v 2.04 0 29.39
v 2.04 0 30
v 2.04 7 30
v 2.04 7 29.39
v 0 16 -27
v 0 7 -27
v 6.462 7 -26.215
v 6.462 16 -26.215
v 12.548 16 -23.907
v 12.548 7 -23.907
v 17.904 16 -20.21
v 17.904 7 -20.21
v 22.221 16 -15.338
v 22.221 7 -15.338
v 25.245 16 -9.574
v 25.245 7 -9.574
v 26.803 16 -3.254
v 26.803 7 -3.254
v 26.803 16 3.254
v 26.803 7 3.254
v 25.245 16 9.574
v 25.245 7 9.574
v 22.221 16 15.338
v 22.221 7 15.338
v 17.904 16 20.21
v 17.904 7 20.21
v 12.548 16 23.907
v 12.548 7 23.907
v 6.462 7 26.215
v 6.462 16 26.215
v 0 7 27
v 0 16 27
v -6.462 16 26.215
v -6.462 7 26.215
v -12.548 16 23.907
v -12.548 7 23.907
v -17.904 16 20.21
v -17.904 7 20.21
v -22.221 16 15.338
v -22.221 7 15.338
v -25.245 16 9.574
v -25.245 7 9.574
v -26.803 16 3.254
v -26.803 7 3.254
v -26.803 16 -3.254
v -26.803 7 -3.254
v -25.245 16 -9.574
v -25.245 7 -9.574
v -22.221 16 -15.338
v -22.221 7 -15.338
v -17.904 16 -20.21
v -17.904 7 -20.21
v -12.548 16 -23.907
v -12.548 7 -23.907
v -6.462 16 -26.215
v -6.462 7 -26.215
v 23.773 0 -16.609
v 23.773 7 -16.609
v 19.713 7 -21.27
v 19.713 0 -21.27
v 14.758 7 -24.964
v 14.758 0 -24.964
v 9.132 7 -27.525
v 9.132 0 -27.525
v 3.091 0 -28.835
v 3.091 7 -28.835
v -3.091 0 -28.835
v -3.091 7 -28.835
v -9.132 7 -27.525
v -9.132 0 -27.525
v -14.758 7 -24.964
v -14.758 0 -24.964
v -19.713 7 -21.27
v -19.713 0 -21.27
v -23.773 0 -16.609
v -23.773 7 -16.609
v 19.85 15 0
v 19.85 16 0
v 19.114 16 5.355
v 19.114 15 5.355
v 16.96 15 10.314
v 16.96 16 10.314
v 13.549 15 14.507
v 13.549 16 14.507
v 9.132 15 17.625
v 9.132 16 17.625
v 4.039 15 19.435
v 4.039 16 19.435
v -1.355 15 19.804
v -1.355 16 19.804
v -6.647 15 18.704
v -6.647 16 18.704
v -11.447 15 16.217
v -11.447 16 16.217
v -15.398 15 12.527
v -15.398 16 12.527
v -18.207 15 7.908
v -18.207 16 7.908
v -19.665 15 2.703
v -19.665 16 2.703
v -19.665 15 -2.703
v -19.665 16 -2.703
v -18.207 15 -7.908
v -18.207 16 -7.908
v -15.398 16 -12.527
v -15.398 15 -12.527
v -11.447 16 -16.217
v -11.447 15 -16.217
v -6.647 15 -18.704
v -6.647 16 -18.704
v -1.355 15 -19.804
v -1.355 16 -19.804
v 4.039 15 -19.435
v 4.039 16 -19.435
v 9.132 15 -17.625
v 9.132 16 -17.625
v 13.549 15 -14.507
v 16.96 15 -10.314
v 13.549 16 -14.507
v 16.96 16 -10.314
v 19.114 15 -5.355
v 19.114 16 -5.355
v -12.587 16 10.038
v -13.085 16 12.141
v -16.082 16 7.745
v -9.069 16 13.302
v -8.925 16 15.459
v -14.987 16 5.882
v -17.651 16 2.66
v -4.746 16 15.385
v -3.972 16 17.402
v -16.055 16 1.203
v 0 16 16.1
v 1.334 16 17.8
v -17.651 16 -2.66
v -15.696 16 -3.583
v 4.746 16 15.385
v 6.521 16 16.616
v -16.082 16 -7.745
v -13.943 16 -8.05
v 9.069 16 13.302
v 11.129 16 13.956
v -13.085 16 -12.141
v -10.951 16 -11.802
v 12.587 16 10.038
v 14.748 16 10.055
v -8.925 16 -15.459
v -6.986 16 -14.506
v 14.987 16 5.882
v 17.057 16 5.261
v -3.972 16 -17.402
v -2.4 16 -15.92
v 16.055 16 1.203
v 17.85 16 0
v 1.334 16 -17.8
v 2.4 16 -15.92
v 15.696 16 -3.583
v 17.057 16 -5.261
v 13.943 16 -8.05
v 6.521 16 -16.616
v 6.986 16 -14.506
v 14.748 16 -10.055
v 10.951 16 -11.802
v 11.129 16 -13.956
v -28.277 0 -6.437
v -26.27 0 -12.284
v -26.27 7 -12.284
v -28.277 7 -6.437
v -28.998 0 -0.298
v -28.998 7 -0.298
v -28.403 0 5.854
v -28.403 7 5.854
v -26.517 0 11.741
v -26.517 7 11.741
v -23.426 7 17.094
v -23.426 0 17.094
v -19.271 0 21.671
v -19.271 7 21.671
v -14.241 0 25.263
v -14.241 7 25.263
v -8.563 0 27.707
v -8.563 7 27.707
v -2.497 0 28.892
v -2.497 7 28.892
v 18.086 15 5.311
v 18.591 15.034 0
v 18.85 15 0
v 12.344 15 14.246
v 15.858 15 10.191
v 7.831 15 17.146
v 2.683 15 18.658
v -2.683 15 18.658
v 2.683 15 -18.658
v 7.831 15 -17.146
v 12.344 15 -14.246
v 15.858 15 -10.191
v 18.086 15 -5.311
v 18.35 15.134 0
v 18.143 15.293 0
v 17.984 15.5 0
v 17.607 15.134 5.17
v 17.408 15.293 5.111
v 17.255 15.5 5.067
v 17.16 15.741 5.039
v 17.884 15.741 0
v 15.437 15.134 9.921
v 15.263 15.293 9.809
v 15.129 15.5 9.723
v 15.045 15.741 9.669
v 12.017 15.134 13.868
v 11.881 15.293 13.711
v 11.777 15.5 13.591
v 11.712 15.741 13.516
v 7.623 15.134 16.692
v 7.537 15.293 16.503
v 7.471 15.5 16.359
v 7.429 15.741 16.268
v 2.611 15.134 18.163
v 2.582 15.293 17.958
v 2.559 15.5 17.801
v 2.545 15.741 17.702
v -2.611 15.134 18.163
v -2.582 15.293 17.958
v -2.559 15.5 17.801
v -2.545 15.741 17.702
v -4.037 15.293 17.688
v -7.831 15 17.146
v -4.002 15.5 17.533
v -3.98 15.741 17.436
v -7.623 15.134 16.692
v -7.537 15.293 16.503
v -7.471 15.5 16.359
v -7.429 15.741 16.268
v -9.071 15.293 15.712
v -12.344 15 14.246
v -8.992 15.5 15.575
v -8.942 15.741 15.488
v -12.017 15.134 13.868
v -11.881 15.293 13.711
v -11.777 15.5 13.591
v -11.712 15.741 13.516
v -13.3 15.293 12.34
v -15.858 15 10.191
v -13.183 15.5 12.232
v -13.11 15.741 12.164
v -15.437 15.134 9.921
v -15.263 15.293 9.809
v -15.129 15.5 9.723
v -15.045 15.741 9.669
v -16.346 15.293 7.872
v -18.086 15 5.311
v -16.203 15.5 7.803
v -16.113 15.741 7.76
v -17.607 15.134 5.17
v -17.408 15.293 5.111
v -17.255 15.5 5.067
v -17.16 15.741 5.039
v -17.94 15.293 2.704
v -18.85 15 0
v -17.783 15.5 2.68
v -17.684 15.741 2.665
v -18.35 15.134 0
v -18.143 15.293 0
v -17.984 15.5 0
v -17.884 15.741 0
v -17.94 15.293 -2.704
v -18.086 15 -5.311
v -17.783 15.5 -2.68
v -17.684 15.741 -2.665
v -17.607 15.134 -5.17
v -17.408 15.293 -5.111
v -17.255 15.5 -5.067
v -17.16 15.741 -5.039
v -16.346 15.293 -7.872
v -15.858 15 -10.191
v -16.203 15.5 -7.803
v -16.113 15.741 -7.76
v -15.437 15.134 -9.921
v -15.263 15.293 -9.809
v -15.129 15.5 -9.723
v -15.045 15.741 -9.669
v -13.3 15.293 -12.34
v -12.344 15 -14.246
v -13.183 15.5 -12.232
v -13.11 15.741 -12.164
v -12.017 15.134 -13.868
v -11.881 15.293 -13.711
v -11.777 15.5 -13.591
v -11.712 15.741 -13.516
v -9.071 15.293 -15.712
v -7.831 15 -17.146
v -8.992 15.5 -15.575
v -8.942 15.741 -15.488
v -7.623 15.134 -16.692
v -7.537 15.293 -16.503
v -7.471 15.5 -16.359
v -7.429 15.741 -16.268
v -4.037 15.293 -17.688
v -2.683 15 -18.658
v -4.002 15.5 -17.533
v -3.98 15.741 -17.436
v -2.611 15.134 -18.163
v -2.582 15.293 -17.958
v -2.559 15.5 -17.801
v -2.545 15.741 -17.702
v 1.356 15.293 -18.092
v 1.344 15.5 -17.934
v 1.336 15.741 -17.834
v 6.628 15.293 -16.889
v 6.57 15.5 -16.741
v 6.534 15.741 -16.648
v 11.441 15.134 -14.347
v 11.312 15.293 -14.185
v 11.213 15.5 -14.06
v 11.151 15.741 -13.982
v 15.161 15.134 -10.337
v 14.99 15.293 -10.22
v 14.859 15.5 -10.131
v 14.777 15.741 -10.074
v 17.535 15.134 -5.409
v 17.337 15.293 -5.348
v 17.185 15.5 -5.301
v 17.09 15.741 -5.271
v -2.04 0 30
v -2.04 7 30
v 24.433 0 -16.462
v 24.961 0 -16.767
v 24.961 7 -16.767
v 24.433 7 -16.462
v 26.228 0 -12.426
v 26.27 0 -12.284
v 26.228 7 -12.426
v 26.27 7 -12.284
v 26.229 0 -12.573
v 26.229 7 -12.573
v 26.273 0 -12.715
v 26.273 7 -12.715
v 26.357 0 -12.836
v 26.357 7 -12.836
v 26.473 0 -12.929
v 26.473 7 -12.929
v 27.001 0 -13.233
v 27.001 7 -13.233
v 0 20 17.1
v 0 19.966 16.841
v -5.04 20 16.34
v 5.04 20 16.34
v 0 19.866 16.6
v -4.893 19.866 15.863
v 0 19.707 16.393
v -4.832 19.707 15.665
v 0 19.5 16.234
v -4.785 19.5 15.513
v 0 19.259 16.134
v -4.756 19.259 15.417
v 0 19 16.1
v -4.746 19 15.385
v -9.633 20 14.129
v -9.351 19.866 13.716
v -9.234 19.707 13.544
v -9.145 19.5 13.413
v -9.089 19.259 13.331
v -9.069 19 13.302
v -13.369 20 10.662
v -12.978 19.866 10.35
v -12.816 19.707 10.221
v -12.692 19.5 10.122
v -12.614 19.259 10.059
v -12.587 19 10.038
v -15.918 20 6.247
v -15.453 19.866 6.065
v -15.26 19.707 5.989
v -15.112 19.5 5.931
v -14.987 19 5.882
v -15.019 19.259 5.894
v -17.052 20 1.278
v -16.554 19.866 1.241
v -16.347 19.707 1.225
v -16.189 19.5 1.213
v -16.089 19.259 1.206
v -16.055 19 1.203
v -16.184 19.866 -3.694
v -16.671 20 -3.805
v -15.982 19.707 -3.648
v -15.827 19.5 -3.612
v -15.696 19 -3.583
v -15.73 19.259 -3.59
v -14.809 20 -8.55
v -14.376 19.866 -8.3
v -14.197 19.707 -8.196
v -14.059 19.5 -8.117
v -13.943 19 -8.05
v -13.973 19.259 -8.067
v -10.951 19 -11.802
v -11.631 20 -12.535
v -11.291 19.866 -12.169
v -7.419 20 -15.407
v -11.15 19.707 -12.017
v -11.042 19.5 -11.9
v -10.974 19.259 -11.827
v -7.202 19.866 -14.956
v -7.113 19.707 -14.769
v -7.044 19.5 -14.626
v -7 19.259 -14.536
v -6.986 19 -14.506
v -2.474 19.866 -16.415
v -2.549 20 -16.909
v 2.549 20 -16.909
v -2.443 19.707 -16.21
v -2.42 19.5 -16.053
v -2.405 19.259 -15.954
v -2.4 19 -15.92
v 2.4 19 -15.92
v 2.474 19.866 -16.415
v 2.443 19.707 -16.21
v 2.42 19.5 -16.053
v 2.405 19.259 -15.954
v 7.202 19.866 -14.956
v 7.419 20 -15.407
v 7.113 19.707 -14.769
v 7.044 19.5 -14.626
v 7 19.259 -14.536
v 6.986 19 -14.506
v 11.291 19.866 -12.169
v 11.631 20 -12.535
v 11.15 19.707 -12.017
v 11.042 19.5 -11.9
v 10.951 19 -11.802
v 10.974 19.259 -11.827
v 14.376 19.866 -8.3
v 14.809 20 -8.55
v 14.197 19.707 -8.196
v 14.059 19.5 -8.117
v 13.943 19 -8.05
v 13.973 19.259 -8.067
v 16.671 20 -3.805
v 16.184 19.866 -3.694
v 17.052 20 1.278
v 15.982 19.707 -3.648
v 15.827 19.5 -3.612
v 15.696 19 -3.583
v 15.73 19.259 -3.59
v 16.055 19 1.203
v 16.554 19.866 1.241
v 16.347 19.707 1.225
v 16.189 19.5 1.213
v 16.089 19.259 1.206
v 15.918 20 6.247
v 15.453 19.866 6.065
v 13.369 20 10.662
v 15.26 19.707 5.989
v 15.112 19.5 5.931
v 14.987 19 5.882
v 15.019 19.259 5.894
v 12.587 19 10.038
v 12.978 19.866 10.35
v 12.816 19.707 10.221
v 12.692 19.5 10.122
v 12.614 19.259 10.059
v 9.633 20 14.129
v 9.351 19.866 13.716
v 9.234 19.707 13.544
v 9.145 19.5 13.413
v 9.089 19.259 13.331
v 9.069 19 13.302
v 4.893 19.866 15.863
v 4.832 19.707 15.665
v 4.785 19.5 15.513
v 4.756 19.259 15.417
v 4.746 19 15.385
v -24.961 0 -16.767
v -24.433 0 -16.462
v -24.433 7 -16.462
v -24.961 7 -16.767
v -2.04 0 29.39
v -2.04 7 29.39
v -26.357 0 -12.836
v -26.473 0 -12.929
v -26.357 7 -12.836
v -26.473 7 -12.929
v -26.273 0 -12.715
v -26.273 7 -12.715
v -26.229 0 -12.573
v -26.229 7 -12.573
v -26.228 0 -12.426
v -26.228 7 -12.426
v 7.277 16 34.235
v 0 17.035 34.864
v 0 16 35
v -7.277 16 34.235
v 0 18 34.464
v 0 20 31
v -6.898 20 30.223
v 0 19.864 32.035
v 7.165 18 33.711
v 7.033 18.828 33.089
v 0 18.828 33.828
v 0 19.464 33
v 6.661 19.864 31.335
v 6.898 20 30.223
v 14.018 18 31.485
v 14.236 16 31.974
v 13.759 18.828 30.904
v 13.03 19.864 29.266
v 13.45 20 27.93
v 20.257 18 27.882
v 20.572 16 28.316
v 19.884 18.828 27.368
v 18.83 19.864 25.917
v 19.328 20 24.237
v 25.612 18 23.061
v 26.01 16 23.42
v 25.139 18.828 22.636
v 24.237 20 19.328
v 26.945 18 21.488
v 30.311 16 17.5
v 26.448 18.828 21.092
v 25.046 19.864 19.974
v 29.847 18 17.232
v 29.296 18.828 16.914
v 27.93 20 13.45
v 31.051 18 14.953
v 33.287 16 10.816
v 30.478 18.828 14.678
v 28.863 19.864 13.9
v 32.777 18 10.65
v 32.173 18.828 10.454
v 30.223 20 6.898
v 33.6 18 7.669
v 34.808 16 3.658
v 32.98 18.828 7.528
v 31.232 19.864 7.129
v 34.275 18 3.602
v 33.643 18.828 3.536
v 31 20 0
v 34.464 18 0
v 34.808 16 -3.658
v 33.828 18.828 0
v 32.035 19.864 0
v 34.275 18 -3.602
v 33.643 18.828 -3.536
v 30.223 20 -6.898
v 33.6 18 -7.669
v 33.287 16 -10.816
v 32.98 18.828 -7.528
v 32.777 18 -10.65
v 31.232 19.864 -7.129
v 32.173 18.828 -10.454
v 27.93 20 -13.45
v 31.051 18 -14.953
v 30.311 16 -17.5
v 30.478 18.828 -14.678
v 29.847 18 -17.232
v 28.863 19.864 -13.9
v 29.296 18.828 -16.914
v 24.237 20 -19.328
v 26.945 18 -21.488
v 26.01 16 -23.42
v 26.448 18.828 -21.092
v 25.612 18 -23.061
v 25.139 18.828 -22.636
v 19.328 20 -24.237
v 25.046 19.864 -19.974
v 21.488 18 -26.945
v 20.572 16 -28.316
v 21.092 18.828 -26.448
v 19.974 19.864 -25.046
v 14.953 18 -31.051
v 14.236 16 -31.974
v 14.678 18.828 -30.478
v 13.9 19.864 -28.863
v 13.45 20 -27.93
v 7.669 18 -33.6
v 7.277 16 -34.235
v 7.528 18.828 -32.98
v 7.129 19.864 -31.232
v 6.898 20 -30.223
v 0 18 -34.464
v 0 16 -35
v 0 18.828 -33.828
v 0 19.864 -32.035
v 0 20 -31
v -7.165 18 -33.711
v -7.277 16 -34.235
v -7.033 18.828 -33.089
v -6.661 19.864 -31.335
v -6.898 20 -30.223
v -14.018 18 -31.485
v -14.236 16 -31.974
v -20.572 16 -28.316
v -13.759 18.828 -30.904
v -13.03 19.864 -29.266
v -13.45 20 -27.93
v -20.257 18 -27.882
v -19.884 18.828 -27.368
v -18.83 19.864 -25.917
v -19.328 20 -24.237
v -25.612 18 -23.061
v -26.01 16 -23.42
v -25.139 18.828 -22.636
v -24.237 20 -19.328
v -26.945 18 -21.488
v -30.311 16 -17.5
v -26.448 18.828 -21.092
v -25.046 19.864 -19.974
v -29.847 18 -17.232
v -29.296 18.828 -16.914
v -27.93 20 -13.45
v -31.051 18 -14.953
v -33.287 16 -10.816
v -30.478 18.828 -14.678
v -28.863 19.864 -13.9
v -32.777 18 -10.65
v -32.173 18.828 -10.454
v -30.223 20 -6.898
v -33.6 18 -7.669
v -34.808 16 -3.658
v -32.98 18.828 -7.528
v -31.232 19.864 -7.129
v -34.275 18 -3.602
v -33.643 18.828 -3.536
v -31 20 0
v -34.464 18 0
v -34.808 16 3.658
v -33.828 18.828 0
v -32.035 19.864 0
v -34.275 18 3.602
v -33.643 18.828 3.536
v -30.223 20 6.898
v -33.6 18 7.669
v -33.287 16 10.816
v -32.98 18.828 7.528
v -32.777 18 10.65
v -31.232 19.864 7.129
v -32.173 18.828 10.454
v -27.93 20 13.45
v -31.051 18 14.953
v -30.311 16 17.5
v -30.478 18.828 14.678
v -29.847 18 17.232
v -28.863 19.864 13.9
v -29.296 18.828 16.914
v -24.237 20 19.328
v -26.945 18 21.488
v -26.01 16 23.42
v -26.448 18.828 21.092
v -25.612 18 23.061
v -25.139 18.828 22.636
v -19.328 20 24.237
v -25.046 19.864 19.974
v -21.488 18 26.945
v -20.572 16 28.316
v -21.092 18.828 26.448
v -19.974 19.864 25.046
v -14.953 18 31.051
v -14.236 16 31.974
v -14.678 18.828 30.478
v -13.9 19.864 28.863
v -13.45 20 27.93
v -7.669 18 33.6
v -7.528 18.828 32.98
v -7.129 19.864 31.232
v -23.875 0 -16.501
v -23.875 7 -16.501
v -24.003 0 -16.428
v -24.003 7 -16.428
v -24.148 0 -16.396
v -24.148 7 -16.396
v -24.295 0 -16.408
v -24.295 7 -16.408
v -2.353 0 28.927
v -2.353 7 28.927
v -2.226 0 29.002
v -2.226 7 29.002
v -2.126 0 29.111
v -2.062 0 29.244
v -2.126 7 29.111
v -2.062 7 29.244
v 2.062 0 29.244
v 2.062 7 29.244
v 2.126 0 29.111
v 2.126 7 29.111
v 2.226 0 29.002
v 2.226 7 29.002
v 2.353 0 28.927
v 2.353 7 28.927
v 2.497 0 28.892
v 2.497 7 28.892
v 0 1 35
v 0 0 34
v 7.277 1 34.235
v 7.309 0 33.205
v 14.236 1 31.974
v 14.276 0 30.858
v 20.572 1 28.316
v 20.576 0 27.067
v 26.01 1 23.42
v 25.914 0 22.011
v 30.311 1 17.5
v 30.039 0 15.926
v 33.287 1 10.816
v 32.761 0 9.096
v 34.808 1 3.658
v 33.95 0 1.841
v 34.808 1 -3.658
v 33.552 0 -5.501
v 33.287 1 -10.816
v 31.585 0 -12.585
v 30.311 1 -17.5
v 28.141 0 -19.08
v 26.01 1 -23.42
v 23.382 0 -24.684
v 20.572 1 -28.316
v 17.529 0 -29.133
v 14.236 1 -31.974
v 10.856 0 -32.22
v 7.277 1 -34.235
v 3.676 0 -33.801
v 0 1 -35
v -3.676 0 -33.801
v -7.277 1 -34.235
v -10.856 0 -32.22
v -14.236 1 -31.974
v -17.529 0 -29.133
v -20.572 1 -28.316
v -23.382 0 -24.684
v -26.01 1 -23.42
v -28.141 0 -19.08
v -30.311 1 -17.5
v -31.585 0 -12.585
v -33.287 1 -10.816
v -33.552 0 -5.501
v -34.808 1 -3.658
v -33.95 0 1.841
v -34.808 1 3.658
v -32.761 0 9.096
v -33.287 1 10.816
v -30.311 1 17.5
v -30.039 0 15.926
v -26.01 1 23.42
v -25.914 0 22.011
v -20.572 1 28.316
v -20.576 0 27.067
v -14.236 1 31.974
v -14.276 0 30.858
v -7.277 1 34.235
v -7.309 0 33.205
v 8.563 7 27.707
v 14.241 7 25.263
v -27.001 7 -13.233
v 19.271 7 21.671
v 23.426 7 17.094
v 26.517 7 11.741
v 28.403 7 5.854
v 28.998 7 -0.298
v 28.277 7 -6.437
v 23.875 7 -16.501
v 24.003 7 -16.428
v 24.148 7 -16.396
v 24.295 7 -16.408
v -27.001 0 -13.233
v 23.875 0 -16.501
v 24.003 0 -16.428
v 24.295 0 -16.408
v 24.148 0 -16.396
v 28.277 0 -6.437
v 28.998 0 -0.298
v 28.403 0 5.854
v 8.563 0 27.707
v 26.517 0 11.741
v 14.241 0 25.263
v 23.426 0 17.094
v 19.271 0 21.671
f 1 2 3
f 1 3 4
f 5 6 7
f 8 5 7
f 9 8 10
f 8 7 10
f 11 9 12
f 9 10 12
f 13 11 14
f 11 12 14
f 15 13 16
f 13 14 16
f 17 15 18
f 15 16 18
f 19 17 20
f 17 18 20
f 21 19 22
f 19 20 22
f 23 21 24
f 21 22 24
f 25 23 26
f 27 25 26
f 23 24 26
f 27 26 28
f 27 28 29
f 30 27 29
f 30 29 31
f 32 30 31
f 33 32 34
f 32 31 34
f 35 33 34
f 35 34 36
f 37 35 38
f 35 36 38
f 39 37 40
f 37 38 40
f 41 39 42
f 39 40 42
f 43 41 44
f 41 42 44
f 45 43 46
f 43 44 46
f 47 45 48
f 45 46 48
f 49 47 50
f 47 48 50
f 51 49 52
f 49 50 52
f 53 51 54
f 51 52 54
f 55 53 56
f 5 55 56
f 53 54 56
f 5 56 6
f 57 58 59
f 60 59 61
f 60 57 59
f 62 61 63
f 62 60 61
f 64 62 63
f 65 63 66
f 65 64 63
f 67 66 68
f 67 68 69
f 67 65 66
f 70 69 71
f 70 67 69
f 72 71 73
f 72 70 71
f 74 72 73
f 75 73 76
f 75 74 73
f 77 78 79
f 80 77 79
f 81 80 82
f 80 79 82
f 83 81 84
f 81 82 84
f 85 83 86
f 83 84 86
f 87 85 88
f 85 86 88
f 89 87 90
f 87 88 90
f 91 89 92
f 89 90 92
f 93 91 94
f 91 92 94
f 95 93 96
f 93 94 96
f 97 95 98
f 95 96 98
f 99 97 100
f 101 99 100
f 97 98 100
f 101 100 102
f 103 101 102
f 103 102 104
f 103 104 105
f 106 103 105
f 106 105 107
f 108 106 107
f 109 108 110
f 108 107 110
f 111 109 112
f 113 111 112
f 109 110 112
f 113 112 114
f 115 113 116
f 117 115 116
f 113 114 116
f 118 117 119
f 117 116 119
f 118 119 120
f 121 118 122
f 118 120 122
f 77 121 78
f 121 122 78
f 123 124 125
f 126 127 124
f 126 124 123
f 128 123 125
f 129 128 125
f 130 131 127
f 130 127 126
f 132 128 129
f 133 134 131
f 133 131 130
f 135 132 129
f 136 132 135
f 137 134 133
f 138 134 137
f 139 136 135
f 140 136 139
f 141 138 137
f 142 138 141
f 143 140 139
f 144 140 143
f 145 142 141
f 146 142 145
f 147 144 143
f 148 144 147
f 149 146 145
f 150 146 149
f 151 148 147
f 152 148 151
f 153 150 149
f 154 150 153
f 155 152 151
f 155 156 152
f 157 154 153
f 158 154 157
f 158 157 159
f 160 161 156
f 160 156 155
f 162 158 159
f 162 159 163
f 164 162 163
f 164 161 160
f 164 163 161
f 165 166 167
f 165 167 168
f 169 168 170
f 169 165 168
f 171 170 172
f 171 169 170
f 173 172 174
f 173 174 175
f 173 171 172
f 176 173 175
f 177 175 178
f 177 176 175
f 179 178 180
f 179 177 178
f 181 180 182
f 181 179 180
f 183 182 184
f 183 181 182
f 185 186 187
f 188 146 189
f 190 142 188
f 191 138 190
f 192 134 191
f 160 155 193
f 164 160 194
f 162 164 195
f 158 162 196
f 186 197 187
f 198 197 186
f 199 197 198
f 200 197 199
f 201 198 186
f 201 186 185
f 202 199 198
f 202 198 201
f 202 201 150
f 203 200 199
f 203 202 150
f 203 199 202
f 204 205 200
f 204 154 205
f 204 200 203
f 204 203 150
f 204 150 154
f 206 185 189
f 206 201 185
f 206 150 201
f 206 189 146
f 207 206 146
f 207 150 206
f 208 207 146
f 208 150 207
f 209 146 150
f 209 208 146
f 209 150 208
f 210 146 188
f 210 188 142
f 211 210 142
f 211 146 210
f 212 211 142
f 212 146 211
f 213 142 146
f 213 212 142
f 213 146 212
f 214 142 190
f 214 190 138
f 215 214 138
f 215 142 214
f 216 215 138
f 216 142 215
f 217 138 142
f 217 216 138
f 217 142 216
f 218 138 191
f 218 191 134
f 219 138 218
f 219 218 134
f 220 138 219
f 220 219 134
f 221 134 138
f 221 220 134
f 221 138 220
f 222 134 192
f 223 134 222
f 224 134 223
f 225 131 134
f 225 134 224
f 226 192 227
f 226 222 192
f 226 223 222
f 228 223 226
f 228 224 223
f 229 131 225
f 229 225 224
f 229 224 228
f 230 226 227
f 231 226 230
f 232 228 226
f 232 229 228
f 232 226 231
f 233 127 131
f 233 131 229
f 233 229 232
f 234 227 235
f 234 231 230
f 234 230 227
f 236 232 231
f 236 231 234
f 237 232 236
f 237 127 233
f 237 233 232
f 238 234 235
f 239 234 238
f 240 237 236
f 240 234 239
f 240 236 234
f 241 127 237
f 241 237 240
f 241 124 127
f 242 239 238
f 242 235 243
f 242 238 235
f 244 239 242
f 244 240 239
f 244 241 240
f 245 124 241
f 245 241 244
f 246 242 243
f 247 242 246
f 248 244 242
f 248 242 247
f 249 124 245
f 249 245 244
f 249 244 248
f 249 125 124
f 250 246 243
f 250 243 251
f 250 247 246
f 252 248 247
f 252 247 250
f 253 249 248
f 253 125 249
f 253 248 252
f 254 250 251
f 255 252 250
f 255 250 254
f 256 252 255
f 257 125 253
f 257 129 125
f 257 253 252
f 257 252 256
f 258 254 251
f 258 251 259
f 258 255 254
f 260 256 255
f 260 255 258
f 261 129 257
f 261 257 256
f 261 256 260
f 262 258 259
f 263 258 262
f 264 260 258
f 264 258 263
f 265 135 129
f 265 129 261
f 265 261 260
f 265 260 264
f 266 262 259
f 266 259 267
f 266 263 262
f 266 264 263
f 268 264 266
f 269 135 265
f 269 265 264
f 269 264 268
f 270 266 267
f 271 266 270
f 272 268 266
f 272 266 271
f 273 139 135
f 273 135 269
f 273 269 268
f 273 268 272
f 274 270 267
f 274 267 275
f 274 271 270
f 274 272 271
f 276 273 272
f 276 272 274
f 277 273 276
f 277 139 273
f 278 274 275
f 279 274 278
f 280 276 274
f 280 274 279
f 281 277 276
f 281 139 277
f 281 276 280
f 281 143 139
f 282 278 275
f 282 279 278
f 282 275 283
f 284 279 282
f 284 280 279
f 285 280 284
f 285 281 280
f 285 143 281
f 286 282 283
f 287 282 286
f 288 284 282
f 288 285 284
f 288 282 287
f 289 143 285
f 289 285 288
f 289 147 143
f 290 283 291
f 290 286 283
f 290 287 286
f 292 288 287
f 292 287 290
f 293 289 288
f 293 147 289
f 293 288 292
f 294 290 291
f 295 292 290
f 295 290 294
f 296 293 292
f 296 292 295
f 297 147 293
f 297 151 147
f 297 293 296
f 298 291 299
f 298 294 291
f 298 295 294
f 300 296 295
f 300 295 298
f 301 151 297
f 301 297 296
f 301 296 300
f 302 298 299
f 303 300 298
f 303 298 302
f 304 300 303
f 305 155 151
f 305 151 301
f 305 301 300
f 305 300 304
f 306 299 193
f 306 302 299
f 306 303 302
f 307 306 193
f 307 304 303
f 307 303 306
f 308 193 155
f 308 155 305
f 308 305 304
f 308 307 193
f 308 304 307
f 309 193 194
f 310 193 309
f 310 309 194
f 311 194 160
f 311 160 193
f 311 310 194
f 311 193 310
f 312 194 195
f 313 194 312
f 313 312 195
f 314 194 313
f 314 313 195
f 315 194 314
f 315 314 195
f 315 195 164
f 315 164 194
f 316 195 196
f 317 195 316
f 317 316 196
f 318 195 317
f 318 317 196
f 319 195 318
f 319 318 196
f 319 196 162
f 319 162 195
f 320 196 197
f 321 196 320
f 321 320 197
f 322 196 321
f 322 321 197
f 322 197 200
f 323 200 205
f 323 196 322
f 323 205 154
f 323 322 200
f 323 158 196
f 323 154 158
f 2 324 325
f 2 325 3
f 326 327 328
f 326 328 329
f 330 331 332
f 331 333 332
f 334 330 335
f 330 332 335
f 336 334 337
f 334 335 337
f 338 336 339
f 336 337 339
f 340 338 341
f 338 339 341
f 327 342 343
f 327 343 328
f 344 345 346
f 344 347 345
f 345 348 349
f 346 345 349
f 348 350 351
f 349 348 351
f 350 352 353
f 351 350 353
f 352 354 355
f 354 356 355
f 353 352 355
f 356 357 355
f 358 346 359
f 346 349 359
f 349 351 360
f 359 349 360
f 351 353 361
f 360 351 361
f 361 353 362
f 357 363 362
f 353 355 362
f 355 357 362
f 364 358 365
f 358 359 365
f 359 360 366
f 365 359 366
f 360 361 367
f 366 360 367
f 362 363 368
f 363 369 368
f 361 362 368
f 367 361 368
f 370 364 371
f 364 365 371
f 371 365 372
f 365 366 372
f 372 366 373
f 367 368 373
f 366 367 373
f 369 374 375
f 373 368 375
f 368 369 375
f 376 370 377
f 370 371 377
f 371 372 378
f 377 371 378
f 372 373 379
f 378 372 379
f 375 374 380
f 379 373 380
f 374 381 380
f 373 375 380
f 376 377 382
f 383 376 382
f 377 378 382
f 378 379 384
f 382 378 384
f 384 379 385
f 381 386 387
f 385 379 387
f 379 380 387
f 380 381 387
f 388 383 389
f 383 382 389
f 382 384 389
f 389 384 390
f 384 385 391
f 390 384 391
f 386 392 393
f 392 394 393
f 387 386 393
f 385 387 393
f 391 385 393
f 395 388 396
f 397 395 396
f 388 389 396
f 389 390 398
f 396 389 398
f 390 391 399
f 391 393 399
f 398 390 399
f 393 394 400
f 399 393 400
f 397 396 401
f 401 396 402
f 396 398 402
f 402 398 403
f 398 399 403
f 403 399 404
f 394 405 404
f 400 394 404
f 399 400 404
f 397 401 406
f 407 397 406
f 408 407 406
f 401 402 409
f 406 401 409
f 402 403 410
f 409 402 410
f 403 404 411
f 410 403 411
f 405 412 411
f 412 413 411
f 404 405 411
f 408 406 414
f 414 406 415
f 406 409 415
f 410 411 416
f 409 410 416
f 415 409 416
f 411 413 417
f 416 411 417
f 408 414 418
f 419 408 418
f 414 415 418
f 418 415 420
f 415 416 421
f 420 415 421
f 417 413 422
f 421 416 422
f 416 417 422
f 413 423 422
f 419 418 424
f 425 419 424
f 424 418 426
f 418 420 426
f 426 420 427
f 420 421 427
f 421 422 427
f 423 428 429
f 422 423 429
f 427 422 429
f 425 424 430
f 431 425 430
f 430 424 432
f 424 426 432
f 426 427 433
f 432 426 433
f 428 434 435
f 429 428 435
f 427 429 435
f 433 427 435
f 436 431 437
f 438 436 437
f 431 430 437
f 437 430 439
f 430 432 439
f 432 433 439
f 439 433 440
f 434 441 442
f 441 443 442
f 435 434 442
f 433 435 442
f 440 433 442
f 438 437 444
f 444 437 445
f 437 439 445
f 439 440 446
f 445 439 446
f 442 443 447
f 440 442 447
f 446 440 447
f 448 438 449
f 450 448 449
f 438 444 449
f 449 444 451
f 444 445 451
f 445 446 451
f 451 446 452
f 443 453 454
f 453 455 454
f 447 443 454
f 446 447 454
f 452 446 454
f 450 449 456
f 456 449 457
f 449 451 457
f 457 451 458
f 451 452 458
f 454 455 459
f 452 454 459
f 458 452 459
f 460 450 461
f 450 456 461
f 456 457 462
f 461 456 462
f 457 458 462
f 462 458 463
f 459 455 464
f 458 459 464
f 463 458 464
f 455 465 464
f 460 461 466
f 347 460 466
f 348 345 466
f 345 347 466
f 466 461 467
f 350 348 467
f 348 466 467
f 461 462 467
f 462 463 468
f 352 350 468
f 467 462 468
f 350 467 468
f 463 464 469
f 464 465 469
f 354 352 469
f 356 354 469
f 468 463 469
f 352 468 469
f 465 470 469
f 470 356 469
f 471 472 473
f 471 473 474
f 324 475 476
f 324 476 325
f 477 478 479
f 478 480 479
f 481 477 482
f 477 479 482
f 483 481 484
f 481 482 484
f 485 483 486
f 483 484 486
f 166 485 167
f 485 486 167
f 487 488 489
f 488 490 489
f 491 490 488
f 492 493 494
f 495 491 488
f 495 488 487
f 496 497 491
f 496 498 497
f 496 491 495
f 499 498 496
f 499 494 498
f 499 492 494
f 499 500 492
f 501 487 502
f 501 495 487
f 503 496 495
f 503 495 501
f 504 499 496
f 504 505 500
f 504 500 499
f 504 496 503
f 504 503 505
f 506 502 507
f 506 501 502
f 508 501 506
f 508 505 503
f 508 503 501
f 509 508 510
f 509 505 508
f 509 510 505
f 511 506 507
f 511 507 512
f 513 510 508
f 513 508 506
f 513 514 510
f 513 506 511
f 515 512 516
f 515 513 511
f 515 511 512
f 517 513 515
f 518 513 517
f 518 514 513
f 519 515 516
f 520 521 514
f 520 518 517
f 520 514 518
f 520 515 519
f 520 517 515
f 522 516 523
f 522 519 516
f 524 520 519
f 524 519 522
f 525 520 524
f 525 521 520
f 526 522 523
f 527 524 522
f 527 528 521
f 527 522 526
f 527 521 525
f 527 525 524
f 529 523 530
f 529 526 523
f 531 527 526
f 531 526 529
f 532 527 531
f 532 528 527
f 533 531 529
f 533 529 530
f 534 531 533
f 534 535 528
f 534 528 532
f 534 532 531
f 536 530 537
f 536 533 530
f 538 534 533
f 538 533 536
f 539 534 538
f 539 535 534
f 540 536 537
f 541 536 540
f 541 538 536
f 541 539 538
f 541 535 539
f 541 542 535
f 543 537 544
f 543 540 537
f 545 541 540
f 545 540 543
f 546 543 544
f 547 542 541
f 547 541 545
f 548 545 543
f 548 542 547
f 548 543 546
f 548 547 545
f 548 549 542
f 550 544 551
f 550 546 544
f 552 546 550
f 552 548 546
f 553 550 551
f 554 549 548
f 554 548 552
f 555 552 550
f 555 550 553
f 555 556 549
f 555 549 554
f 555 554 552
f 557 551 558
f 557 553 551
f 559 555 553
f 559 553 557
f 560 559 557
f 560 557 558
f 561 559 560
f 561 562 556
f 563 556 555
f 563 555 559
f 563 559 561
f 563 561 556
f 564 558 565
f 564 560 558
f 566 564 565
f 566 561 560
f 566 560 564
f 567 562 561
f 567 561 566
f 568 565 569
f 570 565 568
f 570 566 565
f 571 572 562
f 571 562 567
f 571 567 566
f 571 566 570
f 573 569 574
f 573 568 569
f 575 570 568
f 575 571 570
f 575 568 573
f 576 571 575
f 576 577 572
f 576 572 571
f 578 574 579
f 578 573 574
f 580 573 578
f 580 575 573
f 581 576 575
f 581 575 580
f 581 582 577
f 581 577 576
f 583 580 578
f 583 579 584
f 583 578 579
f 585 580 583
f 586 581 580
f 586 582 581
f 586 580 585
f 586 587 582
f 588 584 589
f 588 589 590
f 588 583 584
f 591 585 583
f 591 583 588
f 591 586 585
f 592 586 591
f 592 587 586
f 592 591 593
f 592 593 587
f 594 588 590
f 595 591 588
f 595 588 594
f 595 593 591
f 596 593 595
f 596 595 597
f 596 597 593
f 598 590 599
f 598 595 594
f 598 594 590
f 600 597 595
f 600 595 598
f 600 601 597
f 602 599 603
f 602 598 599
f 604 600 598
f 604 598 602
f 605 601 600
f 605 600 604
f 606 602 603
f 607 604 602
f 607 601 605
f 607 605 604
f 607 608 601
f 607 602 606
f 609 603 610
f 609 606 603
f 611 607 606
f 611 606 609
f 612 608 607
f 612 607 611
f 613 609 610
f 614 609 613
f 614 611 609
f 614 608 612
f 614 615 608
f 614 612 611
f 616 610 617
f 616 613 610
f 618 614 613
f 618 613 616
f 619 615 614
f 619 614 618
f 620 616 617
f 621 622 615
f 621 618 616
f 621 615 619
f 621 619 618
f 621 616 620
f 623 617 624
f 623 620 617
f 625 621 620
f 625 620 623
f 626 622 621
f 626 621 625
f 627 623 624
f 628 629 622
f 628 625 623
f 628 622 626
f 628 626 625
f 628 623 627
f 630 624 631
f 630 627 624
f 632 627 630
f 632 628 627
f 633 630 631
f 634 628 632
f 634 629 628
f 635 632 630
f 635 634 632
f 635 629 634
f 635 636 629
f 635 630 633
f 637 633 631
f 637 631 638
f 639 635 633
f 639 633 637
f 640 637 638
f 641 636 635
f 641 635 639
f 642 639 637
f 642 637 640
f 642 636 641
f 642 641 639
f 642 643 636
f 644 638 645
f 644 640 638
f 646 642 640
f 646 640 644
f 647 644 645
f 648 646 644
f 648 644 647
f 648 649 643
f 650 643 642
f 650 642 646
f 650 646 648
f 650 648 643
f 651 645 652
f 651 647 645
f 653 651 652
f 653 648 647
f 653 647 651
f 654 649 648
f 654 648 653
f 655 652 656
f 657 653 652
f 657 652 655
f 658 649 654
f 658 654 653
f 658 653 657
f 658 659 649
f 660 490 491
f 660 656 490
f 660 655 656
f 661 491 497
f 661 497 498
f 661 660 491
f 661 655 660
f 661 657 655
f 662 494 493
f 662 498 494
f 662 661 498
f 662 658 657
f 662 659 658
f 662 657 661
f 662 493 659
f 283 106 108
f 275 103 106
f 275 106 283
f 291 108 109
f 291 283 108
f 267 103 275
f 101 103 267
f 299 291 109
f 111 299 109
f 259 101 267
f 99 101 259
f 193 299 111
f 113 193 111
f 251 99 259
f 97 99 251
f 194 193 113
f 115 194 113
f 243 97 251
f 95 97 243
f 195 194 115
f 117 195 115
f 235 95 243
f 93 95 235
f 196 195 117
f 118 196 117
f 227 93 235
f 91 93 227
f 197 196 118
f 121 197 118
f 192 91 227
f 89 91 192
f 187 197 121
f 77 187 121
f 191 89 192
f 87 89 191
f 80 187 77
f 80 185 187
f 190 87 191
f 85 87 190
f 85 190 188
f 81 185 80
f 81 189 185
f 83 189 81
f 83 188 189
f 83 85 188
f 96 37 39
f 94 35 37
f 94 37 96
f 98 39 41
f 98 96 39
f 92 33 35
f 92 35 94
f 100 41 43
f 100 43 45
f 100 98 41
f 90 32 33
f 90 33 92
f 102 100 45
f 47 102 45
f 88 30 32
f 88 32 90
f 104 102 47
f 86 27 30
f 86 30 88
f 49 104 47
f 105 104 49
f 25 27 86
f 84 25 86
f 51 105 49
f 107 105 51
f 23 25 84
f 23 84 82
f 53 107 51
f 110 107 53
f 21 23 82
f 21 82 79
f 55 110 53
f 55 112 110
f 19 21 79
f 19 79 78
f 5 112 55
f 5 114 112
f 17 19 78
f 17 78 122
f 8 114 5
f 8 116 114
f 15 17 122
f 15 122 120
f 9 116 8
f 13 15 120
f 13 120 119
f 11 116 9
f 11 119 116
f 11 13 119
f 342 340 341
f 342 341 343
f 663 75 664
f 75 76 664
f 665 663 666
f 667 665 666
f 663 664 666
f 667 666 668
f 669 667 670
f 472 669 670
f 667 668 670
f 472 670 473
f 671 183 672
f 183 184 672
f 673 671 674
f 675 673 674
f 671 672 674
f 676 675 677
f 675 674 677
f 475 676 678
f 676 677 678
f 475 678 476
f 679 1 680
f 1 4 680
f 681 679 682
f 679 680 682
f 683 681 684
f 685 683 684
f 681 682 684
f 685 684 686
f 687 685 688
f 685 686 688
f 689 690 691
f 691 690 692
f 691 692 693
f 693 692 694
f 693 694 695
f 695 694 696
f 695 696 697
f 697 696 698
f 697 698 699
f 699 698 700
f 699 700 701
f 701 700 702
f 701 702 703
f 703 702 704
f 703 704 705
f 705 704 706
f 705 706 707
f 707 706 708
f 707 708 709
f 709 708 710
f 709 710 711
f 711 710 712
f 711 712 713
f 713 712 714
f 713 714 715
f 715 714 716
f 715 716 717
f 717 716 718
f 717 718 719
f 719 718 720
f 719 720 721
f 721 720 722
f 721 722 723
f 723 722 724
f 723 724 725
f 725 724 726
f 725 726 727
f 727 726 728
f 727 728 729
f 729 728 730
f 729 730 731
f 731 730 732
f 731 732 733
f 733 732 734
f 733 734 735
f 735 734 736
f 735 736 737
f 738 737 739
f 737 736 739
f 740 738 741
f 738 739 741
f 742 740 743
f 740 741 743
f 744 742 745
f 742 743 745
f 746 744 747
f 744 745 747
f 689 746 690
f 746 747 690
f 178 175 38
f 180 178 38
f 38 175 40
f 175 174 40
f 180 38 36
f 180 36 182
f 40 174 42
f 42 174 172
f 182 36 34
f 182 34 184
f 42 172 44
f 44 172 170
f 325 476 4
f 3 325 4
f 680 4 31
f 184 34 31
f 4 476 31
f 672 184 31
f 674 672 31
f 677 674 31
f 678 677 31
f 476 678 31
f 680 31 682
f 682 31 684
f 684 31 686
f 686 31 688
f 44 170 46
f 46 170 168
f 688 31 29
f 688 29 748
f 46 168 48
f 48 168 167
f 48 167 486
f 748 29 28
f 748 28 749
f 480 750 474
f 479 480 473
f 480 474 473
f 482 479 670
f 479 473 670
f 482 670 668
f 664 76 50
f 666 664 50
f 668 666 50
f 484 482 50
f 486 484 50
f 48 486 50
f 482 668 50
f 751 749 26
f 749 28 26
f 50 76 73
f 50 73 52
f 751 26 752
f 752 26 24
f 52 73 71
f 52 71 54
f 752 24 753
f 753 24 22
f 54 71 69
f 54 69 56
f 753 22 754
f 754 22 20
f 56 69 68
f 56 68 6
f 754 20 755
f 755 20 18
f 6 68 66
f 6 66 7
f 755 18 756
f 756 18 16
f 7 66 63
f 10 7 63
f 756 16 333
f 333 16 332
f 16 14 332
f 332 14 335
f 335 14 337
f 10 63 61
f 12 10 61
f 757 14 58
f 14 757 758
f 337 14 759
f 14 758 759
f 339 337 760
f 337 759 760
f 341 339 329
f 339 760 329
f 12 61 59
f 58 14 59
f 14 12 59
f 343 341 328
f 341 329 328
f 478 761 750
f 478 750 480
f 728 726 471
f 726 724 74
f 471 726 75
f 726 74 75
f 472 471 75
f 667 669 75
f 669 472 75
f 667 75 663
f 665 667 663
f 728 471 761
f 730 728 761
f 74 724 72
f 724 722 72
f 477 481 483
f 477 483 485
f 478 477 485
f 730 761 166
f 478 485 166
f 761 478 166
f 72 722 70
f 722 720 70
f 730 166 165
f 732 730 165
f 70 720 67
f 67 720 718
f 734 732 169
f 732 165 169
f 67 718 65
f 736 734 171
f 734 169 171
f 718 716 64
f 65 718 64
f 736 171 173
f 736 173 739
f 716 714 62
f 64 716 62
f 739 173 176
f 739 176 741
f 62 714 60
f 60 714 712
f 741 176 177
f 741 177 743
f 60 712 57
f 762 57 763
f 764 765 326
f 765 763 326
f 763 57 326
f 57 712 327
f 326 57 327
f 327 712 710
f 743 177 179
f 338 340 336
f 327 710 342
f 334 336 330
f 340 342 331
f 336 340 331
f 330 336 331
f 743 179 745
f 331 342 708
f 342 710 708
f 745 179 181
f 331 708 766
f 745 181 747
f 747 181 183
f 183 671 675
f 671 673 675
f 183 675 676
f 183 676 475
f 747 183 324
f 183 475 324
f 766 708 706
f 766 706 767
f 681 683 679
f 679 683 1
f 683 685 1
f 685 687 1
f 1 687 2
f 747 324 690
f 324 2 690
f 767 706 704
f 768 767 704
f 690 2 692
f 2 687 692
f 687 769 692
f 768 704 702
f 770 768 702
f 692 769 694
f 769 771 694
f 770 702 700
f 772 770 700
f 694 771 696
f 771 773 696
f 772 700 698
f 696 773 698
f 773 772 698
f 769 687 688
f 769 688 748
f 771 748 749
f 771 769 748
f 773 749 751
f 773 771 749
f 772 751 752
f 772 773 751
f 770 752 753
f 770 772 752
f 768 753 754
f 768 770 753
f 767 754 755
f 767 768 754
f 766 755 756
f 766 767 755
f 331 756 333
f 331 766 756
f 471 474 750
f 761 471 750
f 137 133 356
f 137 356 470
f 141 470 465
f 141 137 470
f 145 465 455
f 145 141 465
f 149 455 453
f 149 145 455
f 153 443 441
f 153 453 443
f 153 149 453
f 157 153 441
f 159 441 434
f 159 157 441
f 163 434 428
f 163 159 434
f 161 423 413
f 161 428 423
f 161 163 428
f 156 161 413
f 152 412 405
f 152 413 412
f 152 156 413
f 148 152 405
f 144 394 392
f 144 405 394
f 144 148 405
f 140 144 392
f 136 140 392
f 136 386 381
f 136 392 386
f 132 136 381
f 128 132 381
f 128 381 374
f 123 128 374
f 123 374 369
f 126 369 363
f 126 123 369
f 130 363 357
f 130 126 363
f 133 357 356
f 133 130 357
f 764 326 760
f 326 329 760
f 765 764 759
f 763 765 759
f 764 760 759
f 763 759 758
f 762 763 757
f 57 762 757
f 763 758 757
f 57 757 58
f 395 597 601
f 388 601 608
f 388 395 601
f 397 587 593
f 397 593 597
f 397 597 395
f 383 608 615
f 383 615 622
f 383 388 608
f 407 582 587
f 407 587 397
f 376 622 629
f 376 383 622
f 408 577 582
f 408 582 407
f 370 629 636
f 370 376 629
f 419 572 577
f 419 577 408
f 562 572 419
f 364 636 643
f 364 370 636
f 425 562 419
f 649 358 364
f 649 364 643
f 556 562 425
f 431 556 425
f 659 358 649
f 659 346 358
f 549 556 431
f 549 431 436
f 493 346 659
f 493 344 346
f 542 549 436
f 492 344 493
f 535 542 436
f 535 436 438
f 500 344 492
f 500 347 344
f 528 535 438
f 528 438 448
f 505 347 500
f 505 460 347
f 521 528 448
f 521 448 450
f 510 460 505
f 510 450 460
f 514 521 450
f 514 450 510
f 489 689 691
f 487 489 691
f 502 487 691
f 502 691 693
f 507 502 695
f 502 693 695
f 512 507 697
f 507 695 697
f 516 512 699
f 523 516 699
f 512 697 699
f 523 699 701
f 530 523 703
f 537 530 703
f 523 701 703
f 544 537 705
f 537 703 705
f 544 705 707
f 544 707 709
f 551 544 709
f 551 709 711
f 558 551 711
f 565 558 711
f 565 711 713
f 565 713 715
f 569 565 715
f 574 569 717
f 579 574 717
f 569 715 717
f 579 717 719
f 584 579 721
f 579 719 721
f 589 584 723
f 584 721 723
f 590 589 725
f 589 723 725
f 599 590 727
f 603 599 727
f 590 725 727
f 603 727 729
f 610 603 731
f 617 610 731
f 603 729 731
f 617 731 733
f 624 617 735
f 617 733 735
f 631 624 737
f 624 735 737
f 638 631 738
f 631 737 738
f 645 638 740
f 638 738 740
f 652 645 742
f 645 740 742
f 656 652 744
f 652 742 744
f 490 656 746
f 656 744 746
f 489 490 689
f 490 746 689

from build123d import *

# Parameters (mm, degrees)
SKETCH7_R            = 35
BOSS_EXTRUDE6_DEPTH  = 20
SKETCH6_R            = 16.1
DISPLAY_CUTOUT_DEPTH = 54.38539126
SKETCH1_R            = 16.1
CUT_EXTRUDE6_DEPTH   = 7
FILLET2_R            = 4
FILLET3_R            = 1
SKETCH8_R            = 27
CUT_EXTRUDE7_DEPTH   = 9
CHAMFER1_SIZE        = 1
FILLET4_R            = 0.5
SKETCH9_R            = 19.85
SKETCH9_R_2          = 17.85
EXTRUDE_THIN1_DEPTH  = 1
FILLET5_R            = 1


with BuildPart() as part:
    # Sketch7 → Boss-Extrude6 (new body)
    with BuildSketch(Plane(origin=(0, 0, 0), x_dir=(1, 0, 0), z_dir=(0, 1, 0))):
        with Locations(Location((0, 0, 0), (0, 0, 270))):
            Circle(SKETCH7_R)
    extrude(amount=BOSS_EXTRUDE6_DEPTH)

    # Sketch6 → Display cutout (cut, through all)
    with BuildSketch(Plane(origin=(0, 0, 0), x_dir=(1, 0, 0), z_dir=(0, 1, 0))):
        with Locations(Location((0, 0, 0), (0, 0, 270))):
            Circle(SKETCH6_R)
    extrude(amount=DISPLAY_CUTOUT_DEPTH, mode=Mode.SUBTRACT)

    # Sketch1 → Cut-Extrude6 (cut)
    with BuildSketch(Plane(origin=(0, 0, 0), x_dir=(1, 0, 0), z_dir=(0, 1, 0))):
        with BuildLine():
            Line((2.04, -30), (2.04, -28.928159292))
            ThreePointArc((2.04, -28.928159292), (25.11473671, -14.5), (26.072520831, 12.697387822))
            Line((26.072520831, 12.697387822), (27.000762114, 13.233308176))
            Line((27.000762114, 13.233308176), (24.960762114, 16.766691824))
            Line((24.960762114, 16.766691824), (24.032520831, 16.23077147))
            ThreePointArc((24.032520831, 16.23077147), (0, 29), (-24.032520831, 16.23077147))
            Line((-24.032520831, 16.23077147), (-24.960762114, 16.766691824))
            Line((-24.960762114, 16.766691824), (-27.000762114, 13.233308176))
            Line((-27.000762114, 13.233308176), (-26.072520831, 12.697387822))
            ThreePointArc((-26.072520831, 12.697387822), (-25.11473671, -14.5), (-2.04, -28.928159292))
            Line((-2.04, -28.928159292), (-2.04, -30))
            Line((-2.04, -30), (2.04, -30))
        make_face()
        with Locations(Location((0, 0, 0), (0, 0, 270))):
            Circle(SKETCH1_R, mode=Mode.SUBTRACT)
    extrude(amount=CUT_EXTRUDE6_DEPTH, mode=Mode.SUBTRACT)

    # Fillet2
    fillet2_edges = [part.edges().sort_by_distance(p)[0] for p in [
        (0, 20, -35),
    ]]
    fillet(fillet2_edges, radius=FILLET2_R)

    # Fillet3
    fillet3_edges = [part.edges().sort_by_distance(p)[0] for p in [
        (0, 20, -16.1),
    ]]
    fillet(fillet3_edges, radius=FILLET3_R)

    # Sketch8 → Cut-Extrude7 (cut)
    with BuildSketch(Plane.XZ.offset(-7)):
        with Locations(Location((0, 0, 0), (0, 0, 270))):
            Circle(SKETCH8_R)
    extrude(amount=-CUT_EXTRUDE7_DEPTH, mode=Mode.SUBTRACT)

    # Chamfer1
    chamfer1_edges = [part.edges().sort_by_distance(p)[0] for p in [
        (0, 0, -35),
    ]]
    chamfer(chamfer1_edges, length=CHAMFER1_SIZE)

    # Fillet4
    fillet4_edges = [part.edges().sort_by_distance(p)[0] for p in [
        (2.04, 3.5, 28.928159292),
        (24.032520831, 3.5, -16.23077147),
        (-26.072520831, 3.5, -12.697387822),
        (-2.04, 3.5, 28.928159292),
        (-24.032520831, 3.5, -16.23077147),
        (26.072520831, 3.5, -12.697387822),
    ]]
    fillet(fillet4_edges, radius=FILLET4_R)

    # Sketch9 → Extrude-Thin1 (add)
    with BuildSketch(Plane.XZ.offset(-16)):
        Circle(SKETCH9_R)
        Circle(SKETCH9_R_2, mode=Mode.SUBTRACT)
    extrude(amount=EXTRUDE_THIN1_DEPTH)

    # Fillet5
    fillet5_edges = [part.edges().sort_by_distance(p)[0] for p in [
        (-17.85, 15, 0),
    ]]
    fillet(fillet5_edges, radius=FILLET5_R - 0.0001)  # a hair under: the kernel refuses the full size


solid = part.part
